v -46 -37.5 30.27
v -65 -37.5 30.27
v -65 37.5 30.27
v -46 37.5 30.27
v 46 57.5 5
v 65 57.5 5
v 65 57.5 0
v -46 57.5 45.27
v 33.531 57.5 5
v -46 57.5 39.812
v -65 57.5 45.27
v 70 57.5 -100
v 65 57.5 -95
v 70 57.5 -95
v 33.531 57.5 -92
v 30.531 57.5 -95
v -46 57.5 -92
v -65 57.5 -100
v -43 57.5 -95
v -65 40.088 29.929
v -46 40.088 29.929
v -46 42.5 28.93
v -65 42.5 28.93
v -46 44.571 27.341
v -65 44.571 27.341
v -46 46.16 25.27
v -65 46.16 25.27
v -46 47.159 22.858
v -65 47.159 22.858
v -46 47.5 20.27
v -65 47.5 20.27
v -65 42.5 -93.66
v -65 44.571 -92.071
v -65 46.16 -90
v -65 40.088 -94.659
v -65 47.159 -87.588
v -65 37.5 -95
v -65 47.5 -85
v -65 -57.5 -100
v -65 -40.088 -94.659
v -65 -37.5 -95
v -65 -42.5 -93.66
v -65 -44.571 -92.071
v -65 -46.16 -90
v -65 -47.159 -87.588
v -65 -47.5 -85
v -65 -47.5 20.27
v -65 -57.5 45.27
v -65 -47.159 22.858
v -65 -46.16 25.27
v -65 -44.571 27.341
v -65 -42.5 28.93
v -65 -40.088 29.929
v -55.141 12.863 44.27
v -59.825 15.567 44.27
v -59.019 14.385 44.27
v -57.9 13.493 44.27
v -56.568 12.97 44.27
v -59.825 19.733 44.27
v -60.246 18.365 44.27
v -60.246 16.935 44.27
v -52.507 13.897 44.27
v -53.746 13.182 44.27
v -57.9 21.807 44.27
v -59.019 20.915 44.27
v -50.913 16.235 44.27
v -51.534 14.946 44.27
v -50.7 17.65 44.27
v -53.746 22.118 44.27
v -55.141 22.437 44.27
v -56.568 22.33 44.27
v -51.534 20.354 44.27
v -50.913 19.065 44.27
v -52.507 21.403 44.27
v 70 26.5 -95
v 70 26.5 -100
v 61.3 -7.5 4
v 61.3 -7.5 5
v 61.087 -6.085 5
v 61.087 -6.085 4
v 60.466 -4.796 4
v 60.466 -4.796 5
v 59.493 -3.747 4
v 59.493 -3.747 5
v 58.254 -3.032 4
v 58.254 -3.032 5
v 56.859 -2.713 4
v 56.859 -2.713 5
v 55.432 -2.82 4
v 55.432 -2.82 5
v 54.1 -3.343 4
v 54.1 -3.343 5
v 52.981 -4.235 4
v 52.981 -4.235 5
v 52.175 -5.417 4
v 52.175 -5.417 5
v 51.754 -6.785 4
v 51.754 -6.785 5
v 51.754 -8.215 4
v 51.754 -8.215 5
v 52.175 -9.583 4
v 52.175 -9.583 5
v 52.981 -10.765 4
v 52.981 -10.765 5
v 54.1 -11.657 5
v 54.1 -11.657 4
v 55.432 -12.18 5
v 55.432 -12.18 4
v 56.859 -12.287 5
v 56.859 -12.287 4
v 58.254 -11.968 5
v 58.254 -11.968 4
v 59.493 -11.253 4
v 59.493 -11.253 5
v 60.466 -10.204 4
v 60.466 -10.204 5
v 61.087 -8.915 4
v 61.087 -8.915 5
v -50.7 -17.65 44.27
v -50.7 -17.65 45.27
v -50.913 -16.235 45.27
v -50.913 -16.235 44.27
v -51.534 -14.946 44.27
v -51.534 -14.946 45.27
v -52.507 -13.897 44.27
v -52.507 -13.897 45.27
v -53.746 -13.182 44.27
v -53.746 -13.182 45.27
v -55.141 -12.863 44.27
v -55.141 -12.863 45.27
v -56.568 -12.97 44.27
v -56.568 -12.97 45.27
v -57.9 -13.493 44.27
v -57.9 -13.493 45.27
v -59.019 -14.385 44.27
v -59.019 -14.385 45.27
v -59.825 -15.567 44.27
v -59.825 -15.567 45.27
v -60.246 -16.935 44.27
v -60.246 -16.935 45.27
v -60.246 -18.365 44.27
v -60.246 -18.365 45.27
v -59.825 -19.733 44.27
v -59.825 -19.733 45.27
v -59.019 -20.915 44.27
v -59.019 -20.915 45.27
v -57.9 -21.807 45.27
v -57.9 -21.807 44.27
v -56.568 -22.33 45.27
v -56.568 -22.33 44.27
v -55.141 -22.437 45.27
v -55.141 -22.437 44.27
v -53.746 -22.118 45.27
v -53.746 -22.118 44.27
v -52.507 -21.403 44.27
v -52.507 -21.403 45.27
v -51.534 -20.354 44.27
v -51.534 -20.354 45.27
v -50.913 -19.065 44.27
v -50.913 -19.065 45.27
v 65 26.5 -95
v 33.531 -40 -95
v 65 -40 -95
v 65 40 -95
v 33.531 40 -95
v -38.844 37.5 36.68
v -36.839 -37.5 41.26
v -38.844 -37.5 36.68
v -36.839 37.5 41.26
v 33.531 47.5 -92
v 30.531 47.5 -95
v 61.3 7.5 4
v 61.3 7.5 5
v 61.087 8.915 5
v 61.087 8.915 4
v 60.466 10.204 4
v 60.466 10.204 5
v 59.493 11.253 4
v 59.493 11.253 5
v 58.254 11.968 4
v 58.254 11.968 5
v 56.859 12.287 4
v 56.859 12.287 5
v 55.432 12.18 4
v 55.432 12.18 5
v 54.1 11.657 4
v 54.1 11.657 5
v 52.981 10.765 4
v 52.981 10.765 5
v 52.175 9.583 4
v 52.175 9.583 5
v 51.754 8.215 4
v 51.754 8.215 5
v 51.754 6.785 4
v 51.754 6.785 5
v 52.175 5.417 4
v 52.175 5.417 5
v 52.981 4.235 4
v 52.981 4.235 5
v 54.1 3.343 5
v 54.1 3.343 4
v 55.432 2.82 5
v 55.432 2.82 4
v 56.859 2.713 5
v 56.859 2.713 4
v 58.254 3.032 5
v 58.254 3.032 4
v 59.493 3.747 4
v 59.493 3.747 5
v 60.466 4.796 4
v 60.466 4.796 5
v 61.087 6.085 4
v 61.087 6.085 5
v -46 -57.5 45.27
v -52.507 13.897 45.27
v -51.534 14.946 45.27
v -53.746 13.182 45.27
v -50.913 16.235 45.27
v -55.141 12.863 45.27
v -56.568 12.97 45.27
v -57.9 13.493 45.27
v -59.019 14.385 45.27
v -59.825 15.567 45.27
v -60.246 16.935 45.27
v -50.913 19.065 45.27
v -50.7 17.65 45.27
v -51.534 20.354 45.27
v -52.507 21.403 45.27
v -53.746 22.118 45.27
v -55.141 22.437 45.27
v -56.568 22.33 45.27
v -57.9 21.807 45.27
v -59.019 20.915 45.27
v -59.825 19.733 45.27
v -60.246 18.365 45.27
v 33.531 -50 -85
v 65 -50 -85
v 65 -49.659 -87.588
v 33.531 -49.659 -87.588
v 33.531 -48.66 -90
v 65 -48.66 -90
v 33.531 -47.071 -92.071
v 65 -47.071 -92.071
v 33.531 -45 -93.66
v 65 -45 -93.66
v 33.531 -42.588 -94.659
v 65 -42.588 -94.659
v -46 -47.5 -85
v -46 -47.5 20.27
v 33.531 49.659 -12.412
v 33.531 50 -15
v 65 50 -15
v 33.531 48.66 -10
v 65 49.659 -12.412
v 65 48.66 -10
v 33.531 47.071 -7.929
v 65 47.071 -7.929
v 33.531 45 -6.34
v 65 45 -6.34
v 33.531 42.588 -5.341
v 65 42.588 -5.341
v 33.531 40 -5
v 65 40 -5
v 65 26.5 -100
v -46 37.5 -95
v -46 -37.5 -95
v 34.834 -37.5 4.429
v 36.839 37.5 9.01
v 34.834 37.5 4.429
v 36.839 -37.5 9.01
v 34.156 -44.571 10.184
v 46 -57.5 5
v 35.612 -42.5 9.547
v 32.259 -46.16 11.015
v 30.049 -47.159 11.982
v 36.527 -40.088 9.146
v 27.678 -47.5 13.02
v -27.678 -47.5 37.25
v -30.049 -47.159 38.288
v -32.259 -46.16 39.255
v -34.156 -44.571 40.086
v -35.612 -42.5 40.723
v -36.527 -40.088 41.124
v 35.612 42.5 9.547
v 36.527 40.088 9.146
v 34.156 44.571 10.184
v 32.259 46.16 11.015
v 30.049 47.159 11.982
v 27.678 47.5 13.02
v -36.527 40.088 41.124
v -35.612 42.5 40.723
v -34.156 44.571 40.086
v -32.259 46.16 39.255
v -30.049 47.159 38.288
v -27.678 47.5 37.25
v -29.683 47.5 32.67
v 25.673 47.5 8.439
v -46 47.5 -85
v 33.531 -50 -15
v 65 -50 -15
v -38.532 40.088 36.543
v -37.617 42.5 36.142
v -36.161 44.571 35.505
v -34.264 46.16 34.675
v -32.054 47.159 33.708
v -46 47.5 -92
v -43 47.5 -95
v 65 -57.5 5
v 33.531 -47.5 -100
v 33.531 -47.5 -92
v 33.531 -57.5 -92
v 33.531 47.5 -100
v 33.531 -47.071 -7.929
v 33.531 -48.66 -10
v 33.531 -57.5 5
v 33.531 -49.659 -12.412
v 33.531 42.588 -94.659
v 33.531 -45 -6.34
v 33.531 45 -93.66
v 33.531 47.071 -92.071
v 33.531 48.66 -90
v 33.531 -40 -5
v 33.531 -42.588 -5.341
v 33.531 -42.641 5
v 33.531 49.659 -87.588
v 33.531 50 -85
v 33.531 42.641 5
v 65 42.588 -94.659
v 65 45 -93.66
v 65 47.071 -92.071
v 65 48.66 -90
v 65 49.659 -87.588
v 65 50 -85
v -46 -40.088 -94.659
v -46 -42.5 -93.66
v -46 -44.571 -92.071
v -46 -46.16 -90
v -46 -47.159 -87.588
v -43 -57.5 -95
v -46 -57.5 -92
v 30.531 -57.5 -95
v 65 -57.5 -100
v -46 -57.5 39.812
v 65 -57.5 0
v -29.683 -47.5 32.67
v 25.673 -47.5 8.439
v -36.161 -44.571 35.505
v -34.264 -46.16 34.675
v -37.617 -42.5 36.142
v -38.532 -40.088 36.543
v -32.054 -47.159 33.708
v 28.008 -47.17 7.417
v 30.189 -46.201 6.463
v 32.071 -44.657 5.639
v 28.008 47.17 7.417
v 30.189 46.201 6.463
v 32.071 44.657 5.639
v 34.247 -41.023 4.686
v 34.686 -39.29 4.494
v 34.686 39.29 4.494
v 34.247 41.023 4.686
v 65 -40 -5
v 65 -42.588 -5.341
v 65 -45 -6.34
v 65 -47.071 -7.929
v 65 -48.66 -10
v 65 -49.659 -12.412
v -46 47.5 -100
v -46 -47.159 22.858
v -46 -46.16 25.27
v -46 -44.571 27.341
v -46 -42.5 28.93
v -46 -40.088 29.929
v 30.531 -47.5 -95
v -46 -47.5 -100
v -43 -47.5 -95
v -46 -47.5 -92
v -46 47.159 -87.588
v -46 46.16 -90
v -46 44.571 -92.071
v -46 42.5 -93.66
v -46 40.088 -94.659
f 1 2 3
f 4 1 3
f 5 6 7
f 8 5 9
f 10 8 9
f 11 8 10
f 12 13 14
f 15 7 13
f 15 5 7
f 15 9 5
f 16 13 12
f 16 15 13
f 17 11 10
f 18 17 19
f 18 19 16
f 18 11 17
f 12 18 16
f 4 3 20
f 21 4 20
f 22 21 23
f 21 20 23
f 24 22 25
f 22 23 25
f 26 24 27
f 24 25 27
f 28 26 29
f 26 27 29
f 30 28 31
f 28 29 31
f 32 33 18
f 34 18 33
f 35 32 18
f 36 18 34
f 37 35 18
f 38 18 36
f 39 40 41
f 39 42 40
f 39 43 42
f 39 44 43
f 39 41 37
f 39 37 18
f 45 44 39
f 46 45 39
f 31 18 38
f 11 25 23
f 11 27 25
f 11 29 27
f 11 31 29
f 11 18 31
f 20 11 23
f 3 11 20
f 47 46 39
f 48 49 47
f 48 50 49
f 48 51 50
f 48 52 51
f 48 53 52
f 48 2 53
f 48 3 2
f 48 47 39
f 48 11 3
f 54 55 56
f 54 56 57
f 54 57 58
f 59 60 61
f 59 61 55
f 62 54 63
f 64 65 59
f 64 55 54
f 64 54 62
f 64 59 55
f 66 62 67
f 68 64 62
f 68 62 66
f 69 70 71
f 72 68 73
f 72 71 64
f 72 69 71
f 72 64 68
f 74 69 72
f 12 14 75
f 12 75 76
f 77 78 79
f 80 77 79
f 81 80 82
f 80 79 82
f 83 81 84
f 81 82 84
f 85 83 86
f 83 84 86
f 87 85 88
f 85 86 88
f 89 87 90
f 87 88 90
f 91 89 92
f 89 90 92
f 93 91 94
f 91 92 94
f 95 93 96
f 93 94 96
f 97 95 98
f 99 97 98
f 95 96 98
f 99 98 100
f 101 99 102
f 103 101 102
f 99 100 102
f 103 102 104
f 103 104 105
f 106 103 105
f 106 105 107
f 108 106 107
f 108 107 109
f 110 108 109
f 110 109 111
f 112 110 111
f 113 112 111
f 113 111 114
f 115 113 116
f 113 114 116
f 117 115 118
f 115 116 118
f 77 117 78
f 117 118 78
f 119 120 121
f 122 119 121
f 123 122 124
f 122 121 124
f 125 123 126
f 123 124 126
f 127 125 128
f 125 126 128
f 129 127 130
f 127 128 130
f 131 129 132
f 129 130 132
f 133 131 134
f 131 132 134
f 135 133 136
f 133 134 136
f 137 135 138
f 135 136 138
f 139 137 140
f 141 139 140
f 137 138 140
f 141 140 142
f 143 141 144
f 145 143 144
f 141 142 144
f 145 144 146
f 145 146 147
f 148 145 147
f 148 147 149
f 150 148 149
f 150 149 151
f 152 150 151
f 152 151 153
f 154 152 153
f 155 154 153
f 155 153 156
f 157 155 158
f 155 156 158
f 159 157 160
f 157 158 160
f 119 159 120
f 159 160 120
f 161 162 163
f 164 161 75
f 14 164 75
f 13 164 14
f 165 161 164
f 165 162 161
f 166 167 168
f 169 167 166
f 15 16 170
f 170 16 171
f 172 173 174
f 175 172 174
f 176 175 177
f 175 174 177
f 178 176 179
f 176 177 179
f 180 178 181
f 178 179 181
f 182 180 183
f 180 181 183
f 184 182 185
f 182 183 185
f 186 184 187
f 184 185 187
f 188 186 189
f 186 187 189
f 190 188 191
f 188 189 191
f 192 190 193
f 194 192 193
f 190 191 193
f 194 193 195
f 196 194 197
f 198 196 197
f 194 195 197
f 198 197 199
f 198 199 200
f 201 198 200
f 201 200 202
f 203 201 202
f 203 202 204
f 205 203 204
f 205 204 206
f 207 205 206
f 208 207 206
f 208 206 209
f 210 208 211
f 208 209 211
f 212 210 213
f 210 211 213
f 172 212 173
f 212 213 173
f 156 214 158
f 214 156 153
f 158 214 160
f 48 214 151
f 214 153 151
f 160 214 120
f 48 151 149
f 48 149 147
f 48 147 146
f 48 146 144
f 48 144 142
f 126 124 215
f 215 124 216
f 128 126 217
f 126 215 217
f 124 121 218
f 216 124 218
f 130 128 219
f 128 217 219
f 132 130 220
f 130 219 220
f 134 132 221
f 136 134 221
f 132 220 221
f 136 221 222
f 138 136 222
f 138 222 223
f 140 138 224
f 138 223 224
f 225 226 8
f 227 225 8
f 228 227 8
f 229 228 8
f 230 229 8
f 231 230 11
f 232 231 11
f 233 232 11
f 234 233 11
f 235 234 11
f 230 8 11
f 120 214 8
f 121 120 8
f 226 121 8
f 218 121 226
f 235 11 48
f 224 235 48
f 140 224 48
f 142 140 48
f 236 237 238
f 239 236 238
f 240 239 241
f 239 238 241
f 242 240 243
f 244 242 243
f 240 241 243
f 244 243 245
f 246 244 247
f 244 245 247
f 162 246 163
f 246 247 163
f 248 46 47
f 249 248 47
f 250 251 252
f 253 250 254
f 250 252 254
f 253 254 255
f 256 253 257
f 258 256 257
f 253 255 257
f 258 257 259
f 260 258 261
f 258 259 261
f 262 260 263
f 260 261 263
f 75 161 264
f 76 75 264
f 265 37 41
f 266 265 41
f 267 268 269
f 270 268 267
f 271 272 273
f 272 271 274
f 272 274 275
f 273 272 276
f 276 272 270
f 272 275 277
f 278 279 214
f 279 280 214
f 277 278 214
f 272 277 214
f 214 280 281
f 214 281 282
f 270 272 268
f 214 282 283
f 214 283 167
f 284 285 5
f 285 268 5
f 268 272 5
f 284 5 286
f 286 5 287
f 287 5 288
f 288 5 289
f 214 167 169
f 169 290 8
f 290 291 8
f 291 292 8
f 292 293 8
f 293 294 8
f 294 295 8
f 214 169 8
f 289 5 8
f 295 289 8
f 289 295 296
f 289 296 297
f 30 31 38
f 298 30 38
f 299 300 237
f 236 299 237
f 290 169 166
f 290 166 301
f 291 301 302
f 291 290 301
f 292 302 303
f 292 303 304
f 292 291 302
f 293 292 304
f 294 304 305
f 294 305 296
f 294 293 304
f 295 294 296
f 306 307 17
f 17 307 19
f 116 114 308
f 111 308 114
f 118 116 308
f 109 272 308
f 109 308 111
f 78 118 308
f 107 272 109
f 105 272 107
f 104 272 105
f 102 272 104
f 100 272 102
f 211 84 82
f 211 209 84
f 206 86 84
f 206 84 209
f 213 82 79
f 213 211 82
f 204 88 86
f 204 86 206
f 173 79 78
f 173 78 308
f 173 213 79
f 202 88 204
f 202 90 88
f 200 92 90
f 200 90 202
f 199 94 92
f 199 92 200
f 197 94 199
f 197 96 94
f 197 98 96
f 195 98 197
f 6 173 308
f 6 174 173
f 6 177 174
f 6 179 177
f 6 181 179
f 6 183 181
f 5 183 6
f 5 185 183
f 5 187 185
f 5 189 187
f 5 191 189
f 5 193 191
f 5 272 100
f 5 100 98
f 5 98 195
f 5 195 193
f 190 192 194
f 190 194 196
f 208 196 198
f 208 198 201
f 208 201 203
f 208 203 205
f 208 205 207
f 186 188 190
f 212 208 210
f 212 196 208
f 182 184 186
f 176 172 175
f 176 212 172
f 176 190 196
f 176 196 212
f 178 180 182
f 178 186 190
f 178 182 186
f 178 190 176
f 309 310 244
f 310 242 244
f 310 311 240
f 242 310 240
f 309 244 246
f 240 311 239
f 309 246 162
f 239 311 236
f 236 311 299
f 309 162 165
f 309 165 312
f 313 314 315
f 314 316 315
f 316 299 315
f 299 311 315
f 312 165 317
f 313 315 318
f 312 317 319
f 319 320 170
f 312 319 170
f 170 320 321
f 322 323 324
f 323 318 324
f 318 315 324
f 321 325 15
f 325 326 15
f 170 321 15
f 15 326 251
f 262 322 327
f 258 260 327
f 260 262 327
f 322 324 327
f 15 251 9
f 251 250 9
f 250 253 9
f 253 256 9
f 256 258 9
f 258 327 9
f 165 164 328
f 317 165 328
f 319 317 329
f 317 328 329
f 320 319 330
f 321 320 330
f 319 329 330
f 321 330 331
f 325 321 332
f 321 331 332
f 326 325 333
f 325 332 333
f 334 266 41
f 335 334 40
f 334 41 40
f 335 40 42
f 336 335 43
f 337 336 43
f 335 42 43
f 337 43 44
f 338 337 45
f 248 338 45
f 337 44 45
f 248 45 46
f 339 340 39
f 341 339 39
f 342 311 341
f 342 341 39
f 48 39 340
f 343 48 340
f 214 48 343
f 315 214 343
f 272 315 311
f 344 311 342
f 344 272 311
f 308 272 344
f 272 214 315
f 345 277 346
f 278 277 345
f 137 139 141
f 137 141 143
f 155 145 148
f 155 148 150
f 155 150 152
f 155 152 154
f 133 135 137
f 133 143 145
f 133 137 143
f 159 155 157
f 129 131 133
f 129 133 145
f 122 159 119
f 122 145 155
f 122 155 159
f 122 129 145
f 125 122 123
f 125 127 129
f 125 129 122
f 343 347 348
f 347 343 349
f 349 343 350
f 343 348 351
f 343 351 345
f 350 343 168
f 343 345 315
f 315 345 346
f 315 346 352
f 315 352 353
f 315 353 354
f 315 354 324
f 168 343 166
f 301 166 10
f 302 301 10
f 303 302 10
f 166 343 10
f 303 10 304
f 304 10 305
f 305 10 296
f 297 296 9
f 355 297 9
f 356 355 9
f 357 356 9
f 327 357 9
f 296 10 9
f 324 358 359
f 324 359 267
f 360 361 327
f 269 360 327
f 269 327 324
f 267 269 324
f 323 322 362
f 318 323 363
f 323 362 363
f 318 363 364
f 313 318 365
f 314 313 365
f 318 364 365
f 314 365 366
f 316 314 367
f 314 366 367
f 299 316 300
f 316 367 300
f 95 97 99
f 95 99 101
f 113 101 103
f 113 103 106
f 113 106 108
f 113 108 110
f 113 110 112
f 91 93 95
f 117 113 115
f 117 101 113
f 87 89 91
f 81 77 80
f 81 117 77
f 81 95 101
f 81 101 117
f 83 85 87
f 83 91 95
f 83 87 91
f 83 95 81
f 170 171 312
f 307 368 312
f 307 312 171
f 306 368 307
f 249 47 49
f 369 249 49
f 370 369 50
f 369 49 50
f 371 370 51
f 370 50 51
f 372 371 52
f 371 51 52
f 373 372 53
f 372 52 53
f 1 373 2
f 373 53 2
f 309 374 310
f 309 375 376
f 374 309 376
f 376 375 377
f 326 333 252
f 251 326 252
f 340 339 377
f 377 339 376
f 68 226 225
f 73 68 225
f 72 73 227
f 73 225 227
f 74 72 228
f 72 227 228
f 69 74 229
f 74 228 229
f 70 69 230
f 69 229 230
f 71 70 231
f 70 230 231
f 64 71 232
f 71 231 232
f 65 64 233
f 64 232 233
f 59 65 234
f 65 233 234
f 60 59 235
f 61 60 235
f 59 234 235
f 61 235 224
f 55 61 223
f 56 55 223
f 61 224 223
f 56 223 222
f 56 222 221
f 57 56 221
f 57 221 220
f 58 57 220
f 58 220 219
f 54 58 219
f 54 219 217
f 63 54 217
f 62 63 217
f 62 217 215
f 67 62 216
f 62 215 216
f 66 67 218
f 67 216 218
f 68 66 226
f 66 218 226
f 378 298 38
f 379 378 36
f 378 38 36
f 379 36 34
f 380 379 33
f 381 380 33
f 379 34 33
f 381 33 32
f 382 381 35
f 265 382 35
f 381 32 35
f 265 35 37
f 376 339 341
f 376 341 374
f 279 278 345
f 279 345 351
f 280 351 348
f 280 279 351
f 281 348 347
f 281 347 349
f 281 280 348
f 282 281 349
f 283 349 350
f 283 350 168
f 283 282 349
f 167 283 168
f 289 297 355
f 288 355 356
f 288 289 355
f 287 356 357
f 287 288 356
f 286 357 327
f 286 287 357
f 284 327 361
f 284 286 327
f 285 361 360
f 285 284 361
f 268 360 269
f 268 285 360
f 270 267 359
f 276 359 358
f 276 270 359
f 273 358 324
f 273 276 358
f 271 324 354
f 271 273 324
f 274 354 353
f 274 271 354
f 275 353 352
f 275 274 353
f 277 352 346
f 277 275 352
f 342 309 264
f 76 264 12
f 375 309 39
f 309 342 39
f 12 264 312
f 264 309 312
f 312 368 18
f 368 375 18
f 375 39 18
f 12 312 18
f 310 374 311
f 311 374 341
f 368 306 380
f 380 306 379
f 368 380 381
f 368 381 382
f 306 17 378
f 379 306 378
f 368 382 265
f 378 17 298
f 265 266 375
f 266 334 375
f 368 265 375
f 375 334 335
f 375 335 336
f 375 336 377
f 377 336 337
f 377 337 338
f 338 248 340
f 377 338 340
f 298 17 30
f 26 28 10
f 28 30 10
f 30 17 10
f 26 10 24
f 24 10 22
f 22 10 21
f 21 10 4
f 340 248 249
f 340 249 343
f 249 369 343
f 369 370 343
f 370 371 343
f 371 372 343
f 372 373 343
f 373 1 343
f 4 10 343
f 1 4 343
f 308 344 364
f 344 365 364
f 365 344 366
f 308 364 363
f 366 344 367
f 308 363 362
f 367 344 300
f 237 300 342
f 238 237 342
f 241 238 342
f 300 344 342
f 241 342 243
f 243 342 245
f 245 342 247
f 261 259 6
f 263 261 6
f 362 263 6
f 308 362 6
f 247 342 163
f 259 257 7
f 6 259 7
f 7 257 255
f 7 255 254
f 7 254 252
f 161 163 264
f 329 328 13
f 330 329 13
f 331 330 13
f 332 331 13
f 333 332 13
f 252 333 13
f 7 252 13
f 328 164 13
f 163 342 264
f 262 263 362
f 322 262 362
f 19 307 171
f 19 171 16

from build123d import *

# Parameters (mm, degrees)
SKETCH2_W           = 115
SKETCH2_H           = 130
SKETCH2_R           = 4.8
BOSS_EXTRUDE1_DEPTH = 5
BOSS_EXTRUDE2_DEPTH = 115
SKETCH4_W           = 98.530736165
SKETCH4_H           = 115
CUT_EXTRUDE1_DEPTH  = 5
SKETCH5_R           = 4.8
CUT_EXTRUDE2_DEPTH  = 1
SKETCH6_R           = 4.8
CUT_EXTRUDE4_DEPTH  = 1
SKETCH7_W           = 19
SKETCH7_H           = 115
BOSS_EXTRUDE3_DEPTH = 39.811986363
SKETCH8_W           = 19
SKETCH8_H           = 115
SKETCH8_W_2         = 31.469263835
BOSS_EXTRUDE4_DEPTH = 100
CUT_EXTRUDE5_DEPTH  = 19
CUT_EXTRUDE6_DEPTH  = 31.469263835
CUT_EXTRUDE7_DEPTH  = 5
SKETCH12_W          = 5
SKETCH12_H          = 10
BOSS_EXTRUDE5_DEPTH = 100
CHAMFER1_SIZE       = 3
SKETCH13_W          = 5
SKETCH13_H          = 31
BOSS_EXTRUDE6_DEPTH = 5


with BuildPart() as part:
    # Sketch2 → Boss-Extrude1 (new body)
    with BuildSketch(Plane(origin=(0, 0, 0), x_dir=(0, 1, 0), z_dir=(0, 0, 1))):
        Rectangle(SKETCH2_W, SKETCH2_H)
        with Locations(Location((-18.09, -55.5, 0), (0, 0, 270))):
            Circle(SKETCH2_R, mode=Mode.SUBTRACT)
        with Locations(Location((18.08, -55.5, 0), (0, 0, 270))):
            Circle(SKETCH2_R, mode=Mode.SUBTRACT)
    extrude(amount=BOSS_EXTRUDE1_DEPTH)

    # Sketch3 → Boss-Extrude2 (add)
    with BuildSketch(Plane(origin=(0, 57.5, 0), x_dir=(-1, 0, 0), z_dir=(0, 1, 0))):
        Polygon((-65, 5), (-46, 5), (46, 45.27), (65, 45.27), (65, 39.811986363), (46, 39.811986363), (-33.530736165, 5), (-33.530736165, 0), (-65, 0), align=None)
    extrude(amount=-BOSS_EXTRUDE2_DEPTH)

    # Sketch4 → Cut-Extrude1 (cut)
    with BuildSketch(Plane.XY.offset(5)):
        with Locations((-15.734631917, 0)):
            Rectangle(SKETCH4_W, SKETCH4_H)
    extrude(amount=-CUT_EXTRUDE1_DEPTH, mode=Mode.SUBTRACT)

    # Sketch5 → Cut-Extrude2 (cut)
    with BuildSketch(Plane.XY.offset(5)):
        with Locations((56.5, 7.5)):
            Circle(SKETCH5_R)
        with Locations((56.5, -7.5)):
            Circle(SKETCH5_R)
    extrude(amount=-CUT_EXTRUDE2_DEPTH, mode=Mode.SUBTRACT)

    # Sketch6 → Cut-Extrude4 (cut)
    with BuildSketch(Plane.XY.offset(45.27)):
        with Locations((-55.5, 17.65)):
            Circle(SKETCH6_R)
        with Locations((-55.5, -17.65)):
            Circle(SKETCH6_R)
    extrude(amount=-CUT_EXTRUDE4_DEPTH, mode=Mode.SUBTRACT)

    # Sketch7 → Boss-Extrude3 (add)
    with BuildSketch(Plane(origin=(0, 0, 39.811986363), x_dir=(1, 0, 0), z_dir=(0, 0, -1))):
        with Locations((-55.5, 0)):
            Rectangle(SKETCH7_W, SKETCH7_H)
    extrude(amount=BOSS_EXTRUDE3_DEPTH)

    # Sketch8 → Boss-Extrude4 (add)
    with BuildSketch(Plane(origin=(0, 0, 0), x_dir=(1, 0, 0), z_dir=(0, 0, -1))):
        with Locations((-55.5, 0)):
            Rectangle(SKETCH8_W, SKETCH8_H)
        with Locations((49.265368083, 0)):
            Rectangle(SKETCH8_W_2, SKETCH8_H)
    extrude(amount=BOSS_EXTRUDE4_DEPTH)

    # Sketch9 → Cut-Extrude5 (cut)
    with BuildSketch(Plane(origin=(-65, 0, 0), x_dir=(0, -1, 0), z_dir=(-1, 0, 0))):
        with BuildLine():
            Line((-37.5, -95), (37.5, -95))
            ThreePointArc((37.5, -95), (44.571067812, -92.071067812), (47.5, -85))
            Line((47.5, -85), (47.5, 20.27))
            ThreePointArc((47.5, 20.27), (44.571067812, 27.341067812), (37.5, 30.27))
            Line((37.5, 30.27), (-37.5, 30.27))
            ThreePointArc((-37.5, 30.27), (-44.571067812, 27.341067812), (-47.5, 20.27))
            Line((-47.5, 20.27), (-47.5, -85))
            ThreePointArc((-47.5, -85), (-44.571067812, -92.071067812), (-37.5, -95))
        make_face()
    extrude(amount=-CUT_EXTRUDE5_DEPTH, mode=Mode.SUBTRACT)

    # Sketch10 → Cut-Extrude6 (cut)
    with BuildSketch(Plane.YZ.offset(65)):
        with BuildLine():
            Line((-40, -95), (40, -95))
            ThreePointArc((40, -95), (47.071067812, -92.071067812), (50, -85))
            Line((50, -85), (50, -15))
            ThreePointArc((50, -15), (47.071067812, -7.928932188), (40, -5))
            Line((40, -5), (-40, -5))
            ThreePointArc((-40, -5), (-47.071067812, -7.928932188), (-50, -15))
            Line((-50, -15), (-50, -85))
            ThreePointArc((-50, -85), (-47.071067812, -92.071067812), (-40, -95))
        make_face()
    extrude(amount=-CUT_EXTRUDE6_DEPTH, mode=Mode.SUBTRACT)

    # Sketch11 → Cut-Extrude7 (cut)
    with BuildSketch(Plane(origin=(9.233013436, 0, 21.093549445), x_dir=(0.9160841896254345, 0, -0.4009859816980028), z_dir=(0.4009859816980028, 0, 0.9160841896254345))):
        with BuildLine():
            Line((-40.292508114, 47.5), (20.134942814, 47.5))
            ThreePointArc((20.134942814, 47.5), (27.206010626, 44.571067812), (30.134942814, 37.5))
            Line((30.134942814, 37.5), (30.134942814, -37.5))
            ThreePointArc((30.134942814, -37.5), (27.206010626, -44.571067812), (20.134942814, -47.5))
            Line((20.134942814, -47.5), (-40.292508114, -47.5))
            ThreePointArc((-40.292508114, -47.5), (-47.363575926, -44.571067812), (-50.292508114, -37.5))
            Line((-50.292508114, -37.5), (-50.292508114, 37.5))
            ThreePointArc((-50.292508114, 37.5), (-47.363575926, 44.571067812), (-40.292508114, 47.5))
        make_face()
    extrude(amount=-CUT_EXTRUDE7_DEPTH, mode=Mode.SUBTRACT)

    # Sketch12 → Boss-Extrude5 (add)
    with BuildSketch(Plane.ZY.offset(65)):
        with Locations((-97.5, 52.5)):
            Rectangle(SKETCH12_W, SKETCH12_H)
        with Locations((-97.5, -52.5)):
            Rectangle(SKETCH12_W, SKETCH12_H)
    extrude(amount=-BOSS_EXTRUDE5_DEPTH)

    # Chamfer1
    chamfer1_edges = [part.edges().sort_by_distance(p)[0] for p in [
        (-46, 52.5, -95),
        (33.530736165, 52.5, -95),
        (-46, -52.5, -95),
        (33.530736165, -52.5, -95),
    ]]
    chamfer(chamfer1_edges, length=CHAMFER1_SIZE)

    # Sketch13 → Boss-Extrude6 (add)
    with BuildSketch(Plane(origin=(65, 0, 0), x_dir=(0, 0, -1), z_dir=(1, 0, 0))):
        with Locations((97.5, 42)):
            Rectangle(SKETCH13_W, SKETCH13_H)
    extrude(amount=BOSS_EXTRUDE6_DEPTH)


solid = part.part
